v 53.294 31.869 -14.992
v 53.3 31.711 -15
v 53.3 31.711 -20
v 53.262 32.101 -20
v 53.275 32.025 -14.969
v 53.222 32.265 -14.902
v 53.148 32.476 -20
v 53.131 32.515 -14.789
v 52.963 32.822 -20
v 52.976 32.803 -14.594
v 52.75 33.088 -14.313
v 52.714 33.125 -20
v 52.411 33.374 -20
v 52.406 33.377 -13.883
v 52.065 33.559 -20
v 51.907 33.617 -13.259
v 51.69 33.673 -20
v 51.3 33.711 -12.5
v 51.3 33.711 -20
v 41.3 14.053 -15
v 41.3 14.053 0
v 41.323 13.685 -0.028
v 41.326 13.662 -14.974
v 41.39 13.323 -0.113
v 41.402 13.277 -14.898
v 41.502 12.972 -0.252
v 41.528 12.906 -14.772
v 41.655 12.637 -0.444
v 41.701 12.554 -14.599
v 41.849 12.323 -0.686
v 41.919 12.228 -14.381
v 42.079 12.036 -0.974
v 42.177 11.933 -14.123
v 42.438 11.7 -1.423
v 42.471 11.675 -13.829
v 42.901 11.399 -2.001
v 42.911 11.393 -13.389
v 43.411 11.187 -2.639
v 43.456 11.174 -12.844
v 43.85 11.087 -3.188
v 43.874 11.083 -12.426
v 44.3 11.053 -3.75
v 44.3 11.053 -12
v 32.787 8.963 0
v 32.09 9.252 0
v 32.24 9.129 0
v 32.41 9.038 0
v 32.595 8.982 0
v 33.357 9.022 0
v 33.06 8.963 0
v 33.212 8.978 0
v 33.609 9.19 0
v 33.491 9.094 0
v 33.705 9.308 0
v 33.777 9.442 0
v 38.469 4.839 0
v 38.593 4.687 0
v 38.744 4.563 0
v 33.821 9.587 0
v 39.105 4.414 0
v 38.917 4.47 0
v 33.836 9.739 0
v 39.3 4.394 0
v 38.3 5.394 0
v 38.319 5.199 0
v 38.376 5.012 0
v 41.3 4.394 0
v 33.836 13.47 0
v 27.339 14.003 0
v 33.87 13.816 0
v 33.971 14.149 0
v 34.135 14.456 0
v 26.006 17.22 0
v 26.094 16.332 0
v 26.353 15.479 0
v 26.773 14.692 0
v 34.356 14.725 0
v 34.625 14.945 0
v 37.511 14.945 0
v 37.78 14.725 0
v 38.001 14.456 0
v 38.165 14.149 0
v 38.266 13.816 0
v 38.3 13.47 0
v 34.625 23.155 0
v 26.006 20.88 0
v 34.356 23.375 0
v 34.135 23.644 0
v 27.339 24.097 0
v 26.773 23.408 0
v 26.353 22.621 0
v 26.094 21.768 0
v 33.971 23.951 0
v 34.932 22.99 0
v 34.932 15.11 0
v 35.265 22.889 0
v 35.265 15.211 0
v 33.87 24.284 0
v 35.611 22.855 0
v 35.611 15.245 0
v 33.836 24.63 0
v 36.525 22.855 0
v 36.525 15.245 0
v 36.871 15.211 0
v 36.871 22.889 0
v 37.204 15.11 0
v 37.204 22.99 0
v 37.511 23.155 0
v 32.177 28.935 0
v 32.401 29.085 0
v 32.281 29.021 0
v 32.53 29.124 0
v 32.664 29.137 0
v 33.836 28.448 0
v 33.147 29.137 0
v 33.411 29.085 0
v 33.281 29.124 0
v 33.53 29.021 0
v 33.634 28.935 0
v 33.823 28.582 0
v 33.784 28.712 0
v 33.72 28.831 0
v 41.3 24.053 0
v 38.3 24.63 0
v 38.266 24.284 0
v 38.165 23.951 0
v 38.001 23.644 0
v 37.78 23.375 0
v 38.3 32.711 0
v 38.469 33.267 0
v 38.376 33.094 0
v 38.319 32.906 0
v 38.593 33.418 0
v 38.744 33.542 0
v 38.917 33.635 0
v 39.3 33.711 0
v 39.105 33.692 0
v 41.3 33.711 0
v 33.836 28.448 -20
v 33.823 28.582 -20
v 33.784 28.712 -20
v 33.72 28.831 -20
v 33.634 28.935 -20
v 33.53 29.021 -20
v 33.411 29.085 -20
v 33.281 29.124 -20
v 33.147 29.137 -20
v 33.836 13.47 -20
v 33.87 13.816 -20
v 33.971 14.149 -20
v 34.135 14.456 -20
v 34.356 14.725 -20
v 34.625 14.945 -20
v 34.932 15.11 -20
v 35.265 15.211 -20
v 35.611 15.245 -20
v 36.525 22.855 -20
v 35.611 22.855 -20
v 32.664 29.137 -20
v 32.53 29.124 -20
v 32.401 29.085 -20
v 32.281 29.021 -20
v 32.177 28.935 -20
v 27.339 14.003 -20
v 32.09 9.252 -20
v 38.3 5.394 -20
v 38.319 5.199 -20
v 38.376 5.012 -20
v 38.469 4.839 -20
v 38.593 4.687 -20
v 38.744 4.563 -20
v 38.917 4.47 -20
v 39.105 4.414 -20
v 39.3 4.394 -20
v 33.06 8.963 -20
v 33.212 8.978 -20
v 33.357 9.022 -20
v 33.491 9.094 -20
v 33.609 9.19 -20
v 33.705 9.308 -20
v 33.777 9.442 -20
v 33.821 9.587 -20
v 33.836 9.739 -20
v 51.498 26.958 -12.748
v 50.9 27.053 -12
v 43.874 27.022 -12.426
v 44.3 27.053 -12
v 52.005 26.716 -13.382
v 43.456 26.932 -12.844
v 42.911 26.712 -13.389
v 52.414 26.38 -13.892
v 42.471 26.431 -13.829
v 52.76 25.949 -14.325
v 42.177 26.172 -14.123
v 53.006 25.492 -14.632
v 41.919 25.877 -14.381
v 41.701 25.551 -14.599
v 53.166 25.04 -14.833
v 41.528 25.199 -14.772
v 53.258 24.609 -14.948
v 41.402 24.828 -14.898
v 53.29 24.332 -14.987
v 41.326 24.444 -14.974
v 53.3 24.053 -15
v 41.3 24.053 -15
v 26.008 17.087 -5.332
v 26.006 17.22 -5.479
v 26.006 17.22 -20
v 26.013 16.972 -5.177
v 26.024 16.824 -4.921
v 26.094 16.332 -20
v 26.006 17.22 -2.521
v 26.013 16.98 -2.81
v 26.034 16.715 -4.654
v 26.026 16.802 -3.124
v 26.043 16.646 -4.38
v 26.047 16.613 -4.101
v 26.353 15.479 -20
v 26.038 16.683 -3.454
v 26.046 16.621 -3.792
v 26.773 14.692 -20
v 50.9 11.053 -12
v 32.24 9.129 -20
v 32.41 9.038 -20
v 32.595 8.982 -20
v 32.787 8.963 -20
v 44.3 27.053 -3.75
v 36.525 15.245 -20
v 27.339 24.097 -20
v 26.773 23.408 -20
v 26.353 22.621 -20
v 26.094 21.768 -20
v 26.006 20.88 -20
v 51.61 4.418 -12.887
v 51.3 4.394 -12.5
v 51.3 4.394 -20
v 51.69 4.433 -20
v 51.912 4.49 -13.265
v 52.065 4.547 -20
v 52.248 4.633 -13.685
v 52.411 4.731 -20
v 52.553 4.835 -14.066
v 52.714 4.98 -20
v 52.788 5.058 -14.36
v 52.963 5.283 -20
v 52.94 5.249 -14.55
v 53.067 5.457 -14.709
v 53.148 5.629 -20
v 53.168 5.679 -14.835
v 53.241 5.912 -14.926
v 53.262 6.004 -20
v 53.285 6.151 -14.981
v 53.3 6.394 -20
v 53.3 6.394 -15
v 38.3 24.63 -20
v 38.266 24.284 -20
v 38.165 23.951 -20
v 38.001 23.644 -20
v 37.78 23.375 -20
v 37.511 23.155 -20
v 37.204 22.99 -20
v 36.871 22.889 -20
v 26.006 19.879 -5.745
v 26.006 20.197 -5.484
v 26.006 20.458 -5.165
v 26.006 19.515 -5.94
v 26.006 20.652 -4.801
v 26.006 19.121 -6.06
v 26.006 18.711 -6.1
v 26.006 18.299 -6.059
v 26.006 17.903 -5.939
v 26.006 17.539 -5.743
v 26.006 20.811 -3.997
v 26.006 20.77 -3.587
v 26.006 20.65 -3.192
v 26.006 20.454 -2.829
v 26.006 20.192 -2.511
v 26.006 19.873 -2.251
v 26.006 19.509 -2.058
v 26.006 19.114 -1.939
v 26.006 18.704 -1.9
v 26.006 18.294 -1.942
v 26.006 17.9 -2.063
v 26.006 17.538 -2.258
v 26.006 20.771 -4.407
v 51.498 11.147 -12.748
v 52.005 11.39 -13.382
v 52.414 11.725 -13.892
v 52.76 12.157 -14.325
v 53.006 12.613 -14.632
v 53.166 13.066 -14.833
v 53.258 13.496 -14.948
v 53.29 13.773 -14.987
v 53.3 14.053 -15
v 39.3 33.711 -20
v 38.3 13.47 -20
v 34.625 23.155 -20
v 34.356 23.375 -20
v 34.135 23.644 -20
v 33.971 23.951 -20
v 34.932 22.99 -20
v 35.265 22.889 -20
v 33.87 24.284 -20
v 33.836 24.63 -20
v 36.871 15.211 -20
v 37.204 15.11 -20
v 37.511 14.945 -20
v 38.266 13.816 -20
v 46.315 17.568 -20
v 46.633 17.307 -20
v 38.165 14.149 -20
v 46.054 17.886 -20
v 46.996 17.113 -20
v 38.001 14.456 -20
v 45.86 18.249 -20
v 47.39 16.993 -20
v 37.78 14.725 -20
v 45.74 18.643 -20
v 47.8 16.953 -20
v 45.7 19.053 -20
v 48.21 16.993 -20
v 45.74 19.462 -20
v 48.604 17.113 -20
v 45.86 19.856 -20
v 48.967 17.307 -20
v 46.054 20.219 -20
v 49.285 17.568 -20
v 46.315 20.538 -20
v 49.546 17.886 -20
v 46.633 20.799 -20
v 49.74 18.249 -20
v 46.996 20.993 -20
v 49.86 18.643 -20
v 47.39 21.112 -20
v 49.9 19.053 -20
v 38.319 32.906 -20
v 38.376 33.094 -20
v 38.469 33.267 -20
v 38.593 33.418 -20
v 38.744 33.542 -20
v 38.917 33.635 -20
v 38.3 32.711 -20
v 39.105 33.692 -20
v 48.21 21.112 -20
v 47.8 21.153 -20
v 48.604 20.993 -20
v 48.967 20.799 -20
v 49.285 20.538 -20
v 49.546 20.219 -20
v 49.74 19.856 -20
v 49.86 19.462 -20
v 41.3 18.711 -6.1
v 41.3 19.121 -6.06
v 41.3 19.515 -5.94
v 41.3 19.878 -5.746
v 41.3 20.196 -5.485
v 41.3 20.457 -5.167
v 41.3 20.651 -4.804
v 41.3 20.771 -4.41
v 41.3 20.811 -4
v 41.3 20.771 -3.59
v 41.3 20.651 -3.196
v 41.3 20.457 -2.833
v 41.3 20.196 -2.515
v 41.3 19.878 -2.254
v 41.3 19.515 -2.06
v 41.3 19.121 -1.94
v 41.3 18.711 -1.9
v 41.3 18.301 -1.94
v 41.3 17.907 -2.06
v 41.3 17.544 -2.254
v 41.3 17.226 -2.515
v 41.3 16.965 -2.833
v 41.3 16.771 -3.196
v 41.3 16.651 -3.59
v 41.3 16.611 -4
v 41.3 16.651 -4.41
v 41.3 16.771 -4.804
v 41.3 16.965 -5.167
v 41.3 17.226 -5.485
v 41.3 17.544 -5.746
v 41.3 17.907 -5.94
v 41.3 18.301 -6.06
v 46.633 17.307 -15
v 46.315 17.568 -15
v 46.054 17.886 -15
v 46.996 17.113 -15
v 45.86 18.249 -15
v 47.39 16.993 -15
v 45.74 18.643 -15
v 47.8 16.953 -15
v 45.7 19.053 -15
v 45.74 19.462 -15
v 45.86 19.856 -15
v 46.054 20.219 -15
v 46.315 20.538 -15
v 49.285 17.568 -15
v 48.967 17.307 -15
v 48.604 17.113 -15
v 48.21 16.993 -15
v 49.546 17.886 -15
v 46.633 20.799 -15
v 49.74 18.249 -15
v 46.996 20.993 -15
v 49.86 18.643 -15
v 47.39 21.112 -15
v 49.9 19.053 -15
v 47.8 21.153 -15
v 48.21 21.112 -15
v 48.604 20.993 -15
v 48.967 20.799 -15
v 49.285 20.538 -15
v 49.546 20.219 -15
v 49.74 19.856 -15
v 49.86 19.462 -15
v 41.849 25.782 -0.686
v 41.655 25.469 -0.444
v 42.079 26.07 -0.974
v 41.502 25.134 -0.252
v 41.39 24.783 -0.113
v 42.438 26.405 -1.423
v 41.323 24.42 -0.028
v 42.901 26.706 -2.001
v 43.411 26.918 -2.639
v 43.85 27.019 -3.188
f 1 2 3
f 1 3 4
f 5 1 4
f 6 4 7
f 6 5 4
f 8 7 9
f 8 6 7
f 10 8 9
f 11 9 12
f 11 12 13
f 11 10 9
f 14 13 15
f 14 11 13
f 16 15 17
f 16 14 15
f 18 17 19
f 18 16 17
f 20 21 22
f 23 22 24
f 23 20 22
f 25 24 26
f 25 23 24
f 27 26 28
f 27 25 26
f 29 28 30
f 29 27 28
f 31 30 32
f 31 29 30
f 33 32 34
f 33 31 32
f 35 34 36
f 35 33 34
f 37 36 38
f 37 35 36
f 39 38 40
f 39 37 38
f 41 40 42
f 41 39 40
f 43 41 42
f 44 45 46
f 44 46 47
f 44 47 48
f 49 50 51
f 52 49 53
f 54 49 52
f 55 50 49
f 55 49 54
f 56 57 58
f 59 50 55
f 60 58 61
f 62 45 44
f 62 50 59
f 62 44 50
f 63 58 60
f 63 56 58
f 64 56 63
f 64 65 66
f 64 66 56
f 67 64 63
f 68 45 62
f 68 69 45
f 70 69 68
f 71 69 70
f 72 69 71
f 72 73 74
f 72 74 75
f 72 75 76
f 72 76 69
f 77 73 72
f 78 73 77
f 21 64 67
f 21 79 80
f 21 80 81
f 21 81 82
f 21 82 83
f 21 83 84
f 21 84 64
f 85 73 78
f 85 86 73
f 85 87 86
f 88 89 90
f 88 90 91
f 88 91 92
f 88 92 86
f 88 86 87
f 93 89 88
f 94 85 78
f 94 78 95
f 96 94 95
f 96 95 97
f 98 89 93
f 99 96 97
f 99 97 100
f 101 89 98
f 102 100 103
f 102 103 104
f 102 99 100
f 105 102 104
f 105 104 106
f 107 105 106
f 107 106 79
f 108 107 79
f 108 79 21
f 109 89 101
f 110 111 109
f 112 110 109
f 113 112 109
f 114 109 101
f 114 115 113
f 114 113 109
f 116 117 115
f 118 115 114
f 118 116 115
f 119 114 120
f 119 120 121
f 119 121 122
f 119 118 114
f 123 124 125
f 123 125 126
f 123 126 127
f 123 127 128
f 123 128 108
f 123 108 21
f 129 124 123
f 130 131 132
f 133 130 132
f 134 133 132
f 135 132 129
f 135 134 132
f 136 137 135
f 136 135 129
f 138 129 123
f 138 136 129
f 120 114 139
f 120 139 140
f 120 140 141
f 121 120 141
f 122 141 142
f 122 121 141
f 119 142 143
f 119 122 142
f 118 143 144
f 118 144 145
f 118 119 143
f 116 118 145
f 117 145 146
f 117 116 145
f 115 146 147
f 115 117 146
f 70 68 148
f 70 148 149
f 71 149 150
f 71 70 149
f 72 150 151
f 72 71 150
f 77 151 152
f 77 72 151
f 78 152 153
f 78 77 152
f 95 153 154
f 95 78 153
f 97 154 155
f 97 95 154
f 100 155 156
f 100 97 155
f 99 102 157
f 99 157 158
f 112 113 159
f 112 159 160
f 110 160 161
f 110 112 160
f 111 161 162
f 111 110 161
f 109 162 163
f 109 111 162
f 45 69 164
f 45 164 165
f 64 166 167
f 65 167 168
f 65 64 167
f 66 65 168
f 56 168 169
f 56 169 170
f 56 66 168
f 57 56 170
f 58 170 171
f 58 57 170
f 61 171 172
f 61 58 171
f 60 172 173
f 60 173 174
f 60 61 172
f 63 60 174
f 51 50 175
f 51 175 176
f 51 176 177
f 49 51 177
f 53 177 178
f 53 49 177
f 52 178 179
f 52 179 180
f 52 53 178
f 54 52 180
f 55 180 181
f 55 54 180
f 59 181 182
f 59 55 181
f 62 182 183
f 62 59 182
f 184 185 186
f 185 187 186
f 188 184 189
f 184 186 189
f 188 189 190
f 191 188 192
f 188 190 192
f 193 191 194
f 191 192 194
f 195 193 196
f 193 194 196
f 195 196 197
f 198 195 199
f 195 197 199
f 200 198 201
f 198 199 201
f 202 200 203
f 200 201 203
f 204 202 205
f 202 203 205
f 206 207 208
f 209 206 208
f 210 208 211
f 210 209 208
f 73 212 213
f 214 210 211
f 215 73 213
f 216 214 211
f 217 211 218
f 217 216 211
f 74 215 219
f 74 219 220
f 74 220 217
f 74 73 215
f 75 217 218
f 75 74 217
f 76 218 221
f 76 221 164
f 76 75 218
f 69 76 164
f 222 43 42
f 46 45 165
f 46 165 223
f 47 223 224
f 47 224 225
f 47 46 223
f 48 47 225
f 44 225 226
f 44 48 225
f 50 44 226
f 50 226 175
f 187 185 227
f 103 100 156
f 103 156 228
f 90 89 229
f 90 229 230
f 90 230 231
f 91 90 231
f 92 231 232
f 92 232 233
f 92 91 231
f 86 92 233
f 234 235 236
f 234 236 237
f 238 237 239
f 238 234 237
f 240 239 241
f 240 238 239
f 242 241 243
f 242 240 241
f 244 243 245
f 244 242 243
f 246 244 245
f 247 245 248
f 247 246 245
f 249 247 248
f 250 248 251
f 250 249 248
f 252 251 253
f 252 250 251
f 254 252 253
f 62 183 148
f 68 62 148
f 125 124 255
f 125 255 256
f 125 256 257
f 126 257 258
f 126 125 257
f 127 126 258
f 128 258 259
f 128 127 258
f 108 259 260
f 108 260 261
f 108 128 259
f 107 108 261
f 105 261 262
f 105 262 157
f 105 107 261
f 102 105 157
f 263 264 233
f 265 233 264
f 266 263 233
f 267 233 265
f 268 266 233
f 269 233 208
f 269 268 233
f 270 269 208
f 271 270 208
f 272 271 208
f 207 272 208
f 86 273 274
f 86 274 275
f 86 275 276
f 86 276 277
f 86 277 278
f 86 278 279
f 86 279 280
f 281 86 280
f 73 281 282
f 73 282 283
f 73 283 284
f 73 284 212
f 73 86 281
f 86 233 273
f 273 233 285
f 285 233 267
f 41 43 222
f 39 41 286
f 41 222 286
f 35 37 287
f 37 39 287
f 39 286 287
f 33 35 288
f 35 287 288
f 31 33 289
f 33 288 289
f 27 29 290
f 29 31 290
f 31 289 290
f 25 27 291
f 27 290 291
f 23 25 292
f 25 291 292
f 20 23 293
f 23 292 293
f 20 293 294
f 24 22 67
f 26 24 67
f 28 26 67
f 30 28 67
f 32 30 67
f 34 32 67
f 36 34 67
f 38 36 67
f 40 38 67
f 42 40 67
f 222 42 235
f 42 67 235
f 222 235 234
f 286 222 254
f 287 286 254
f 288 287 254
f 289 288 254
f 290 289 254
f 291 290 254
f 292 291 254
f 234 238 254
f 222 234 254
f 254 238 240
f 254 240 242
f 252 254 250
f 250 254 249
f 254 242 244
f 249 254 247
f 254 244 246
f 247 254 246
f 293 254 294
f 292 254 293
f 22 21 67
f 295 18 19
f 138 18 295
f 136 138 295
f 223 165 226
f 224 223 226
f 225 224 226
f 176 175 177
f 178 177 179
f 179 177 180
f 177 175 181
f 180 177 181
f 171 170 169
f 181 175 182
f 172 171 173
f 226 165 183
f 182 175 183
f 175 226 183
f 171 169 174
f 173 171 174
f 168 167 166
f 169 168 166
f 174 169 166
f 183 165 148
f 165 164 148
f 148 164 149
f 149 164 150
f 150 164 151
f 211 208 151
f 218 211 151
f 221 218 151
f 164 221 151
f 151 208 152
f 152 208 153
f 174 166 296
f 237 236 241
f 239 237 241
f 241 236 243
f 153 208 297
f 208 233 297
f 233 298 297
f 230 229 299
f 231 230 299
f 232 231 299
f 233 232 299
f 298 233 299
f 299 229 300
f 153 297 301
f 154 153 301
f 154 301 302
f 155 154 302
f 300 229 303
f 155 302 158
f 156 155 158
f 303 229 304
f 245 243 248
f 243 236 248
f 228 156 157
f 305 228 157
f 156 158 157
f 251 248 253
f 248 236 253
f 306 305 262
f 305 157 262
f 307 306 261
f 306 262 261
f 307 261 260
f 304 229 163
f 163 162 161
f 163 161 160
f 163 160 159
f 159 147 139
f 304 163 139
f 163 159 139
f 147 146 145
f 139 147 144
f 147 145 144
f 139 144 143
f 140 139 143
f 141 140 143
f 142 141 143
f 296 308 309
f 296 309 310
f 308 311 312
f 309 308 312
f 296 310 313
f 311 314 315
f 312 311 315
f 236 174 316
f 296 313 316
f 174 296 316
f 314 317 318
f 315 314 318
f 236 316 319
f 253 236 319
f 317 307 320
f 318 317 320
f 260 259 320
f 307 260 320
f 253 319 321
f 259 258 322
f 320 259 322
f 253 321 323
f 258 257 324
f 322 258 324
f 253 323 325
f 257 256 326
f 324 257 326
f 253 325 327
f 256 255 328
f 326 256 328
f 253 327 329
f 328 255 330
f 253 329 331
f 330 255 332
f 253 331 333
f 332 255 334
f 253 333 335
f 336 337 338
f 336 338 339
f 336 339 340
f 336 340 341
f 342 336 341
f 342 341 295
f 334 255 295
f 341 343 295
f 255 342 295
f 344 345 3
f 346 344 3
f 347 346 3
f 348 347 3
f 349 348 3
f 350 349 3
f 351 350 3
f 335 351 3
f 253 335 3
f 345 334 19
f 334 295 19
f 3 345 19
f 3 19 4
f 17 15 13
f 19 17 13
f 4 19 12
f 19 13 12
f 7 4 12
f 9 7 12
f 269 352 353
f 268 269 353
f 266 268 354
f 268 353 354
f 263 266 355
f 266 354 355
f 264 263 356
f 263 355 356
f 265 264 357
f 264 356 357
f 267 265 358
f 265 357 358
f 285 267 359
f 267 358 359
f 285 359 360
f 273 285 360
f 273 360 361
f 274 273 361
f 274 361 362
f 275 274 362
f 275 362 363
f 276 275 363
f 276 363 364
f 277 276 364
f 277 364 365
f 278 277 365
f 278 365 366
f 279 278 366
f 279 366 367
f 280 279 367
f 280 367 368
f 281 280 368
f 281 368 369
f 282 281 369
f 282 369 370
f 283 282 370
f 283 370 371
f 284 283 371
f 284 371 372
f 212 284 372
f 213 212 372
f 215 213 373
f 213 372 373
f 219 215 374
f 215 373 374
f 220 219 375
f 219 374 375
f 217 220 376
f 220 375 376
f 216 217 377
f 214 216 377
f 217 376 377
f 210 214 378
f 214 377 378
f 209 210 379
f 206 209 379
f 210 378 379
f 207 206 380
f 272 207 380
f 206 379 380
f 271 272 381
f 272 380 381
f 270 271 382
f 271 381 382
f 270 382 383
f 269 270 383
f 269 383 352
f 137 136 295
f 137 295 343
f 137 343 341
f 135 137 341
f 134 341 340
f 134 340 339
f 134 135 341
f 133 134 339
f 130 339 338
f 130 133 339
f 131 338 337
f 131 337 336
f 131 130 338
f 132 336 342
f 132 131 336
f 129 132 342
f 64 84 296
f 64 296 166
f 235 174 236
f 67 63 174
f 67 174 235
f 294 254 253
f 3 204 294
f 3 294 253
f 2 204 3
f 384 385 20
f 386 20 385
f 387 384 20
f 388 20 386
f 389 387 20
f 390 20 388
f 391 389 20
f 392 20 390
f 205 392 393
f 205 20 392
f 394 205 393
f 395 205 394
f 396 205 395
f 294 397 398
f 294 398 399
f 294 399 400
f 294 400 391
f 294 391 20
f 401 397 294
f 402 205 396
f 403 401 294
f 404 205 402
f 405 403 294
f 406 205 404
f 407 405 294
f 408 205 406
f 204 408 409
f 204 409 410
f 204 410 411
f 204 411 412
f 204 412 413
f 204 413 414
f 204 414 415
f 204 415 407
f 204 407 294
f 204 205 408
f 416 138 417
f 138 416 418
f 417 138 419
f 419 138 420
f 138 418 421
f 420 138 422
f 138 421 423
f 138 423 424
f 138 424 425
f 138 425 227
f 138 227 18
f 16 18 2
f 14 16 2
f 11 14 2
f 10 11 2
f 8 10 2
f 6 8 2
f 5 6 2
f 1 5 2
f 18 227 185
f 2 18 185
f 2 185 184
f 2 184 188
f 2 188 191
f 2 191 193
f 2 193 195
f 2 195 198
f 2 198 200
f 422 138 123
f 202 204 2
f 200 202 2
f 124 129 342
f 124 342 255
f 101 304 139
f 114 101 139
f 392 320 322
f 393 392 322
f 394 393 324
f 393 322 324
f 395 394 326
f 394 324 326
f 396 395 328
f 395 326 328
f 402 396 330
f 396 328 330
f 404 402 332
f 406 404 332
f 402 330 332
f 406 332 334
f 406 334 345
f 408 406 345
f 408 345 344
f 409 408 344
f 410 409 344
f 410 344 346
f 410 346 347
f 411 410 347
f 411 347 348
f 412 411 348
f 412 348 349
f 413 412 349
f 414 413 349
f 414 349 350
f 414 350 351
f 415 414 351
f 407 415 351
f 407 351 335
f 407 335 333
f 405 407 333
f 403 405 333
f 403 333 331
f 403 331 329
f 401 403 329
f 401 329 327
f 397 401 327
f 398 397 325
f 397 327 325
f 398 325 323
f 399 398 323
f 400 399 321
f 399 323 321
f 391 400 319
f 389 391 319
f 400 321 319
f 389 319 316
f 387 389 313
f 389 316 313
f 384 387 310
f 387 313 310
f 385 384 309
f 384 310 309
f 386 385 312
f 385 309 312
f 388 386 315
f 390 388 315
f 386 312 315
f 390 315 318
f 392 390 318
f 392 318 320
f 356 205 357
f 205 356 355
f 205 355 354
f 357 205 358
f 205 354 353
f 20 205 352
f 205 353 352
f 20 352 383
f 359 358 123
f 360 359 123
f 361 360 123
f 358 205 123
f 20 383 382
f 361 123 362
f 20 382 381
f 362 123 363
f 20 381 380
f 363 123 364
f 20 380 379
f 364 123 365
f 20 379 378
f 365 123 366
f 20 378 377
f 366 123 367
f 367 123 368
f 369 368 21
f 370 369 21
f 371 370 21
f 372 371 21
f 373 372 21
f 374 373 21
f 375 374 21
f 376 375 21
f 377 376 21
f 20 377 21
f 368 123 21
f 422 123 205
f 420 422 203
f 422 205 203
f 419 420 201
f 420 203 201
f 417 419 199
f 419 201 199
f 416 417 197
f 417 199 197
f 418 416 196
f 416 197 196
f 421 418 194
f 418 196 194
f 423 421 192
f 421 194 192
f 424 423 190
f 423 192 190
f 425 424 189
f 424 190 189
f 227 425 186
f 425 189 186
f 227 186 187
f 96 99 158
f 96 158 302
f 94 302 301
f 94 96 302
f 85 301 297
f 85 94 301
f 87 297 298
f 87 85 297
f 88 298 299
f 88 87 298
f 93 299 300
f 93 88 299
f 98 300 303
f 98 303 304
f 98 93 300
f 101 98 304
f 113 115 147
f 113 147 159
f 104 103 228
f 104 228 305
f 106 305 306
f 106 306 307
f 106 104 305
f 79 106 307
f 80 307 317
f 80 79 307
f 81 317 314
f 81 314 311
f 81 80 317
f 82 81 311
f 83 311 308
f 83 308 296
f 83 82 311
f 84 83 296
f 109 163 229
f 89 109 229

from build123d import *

# Parameters (mm, degrees)
BOSS_EXTRUDE1_DEPTH = 20
CUT_EXTRUDE5_DEPTH  = 15
SKETCH3_R           = 2.1
CUT_EXTRUDE2_DEPTH  = 43.075221209
SKETCH5_R           = 2.1
CUT_EXTRUDE4_DEPTH  = 67.161318327
CUT_EXTRUDE6_DEPTH  = 65.034014837
FILLET1_R           = 3


with BuildPart() as part:
    # Sketch1 → Boss-Extrude1 (new body)
    with BuildSketch(Plane.XY):
        with BuildLine():
            Line((38.3, 10.745623604), (38.3, 9.881410941))
            Line((38.3, 9.881410941), (38.3, 5.394343623))
            ThreePointArc((38.3, 5.394343623), (38.592893219, 4.687236842), (39.3, 4.394343623))
            Line((39.3, 4.394343623), (40.3, 4.394343623))
            Line((40.3, 4.394343623), (51.3, 4.394343623))
            ThreePointArc((51.3, 4.394343623), (52.714213562, 4.98013006), (53.3, 6.394343623))
            Line((53.3, 6.394343623), (53.3, 29.710978016))
            Line((53.3, 29.710978016), (53.3, 31.710978016))
            ThreePointArc((53.3, 31.710978016), (52.714213562, 33.125191579), (51.3, 33.710978016))
            Line((51.3, 33.710978016), (41.3, 33.710978016))
            Line((41.3, 33.710978016), (39.3, 33.710978016))
            ThreePointArc((39.3, 33.710978016), (38.592893219, 33.418084798), (38.3, 32.710978016))
            Line((38.3, 32.710978016), (38.3, 28.215588568))
            Line((38.3, 28.215588568), (38.3, 27.353495632))
            Line((38.3, 27.353495632), (38.3, 24.630195866))
            ThreePointArc((38.3, 24.630195866), (37.780173169, 23.37522288), (36.525200183, 22.855396049))
            Line((36.525200183, 22.855396049), (35.6108, 22.855396049))
            ThreePointArc((35.6108, 22.855396049), (34.355826885, 23.375222934), (33.836, 24.630196049))
            Line((33.836, 24.630196049), (33.836, 28.448))
            ThreePointArc((33.836, 28.448), (33.634196572, 28.935196572), (33.147, 29.137))
            Line((33.147, 29.137), (32.664287242, 29.137))
            ThreePointArc((32.664287242, 29.137), (32.400617966, 29.084552836), (32.177090071, 28.935195973))
            Line((32.177090071, 28.935195973), (27.33900161, 24.097095612))
            ThreePointArc((27.33900161, 24.097095612), (26.352731832, 22.621035632), (26.0064, 20.879905136))
            Line((26.0064, 20.879905136), (26.0064, 17.220094864))
            ThreePointArc((26.0064, 17.220094864), (26.352731832, 15.478964368), (27.33900161, 14.002904388))
            Line((27.33900161, 14.002904388), (32.090366071, 9.25152824))
            ThreePointArc((32.090366071, 9.25152824), (32.409953896, 9.037986056), (32.786933649, 8.963))
            Line((32.786933649, 8.963), (33.060275787, 8.963))
            ThreePointArc((33.060275787, 8.963), (33.608795638, 9.190204362), (33.836, 9.738724213))
            Line((33.836, 9.738724213), (33.836, 13.469803585))
            ThreePointArc((33.836, 13.469803585), (34.355826992, 14.724776959), (35.610800366, 15.244603951))
            Line((35.610800366, 15.244603951), (36.5252, 15.244603951))
            ThreePointArc((36.5252, 15.244603951), (37.780173115, 14.724777066), (38.3, 13.469803951))
            Line((38.3, 13.469803951), (38.3, 10.745623604))
        make_face()
    extrude(amount=-BOSS_EXTRUDE1_DEPTH)

    # Sketch6 → Cut-Extrude5 (cut)
    with BuildSketch(Plane.XY):
        Polygon((53.3, 19.05266082), (53.3, 27.05266082), (41.3, 27.05266082), (41.3, 13.469803951), (41.3, 11.05266082), (53.3, 11.05266082), align=None)
    extrude(amount=-CUT_EXTRUDE5_DEPTH, mode=Mode.SUBTRACT)

    # Sketch3 → Cut-Extrude2 (cut, through all)
    with BuildSketch(Plane(origin=(41.3, 0, 0), x_dir=(0, 0, -1), z_dir=(1, 0, 0))):
        with Locations((4, 18.710978016)):
            Circle(SKETCH3_R)
    extrude(amount=-CUT_EXTRUDE2_DEPTH, mode=Mode.SUBTRACT)

    # Sketch5 → Cut-Extrude4 (cut, through all)
    with BuildSketch(Plane(origin=(0, 0, -20), x_dir=(-1, 0, 0), z_dir=(0, 0, -1))):
        with Locations((-47.8, 19.05266082)):
            Circle(SKETCH5_R)
    extrude(amount=-CUT_EXTRUDE4_DEPTH, mode=Mode.SUBTRACT)

    # Sketch7 → Cut-Extrude6 (cut, through all)
    with BuildSketch(Plane.XZ.offset(-4.394343623)):
        Polygon((41.3, 0), (53.3, -15), (53.3, 0), align=None)
    extrude(amount=-CUT_EXTRUDE6_DEPTH, mode=Mode.SUBTRACT)

    # Fillet1
    fillet1_edges = [part.edges().sort_by_distance(p)[0] for p in [
        (41.3, 11.05266082, -7.5),
        (41.3, 27.05266082, -7.5),
        (47.3, 11.05266082, -15),
        (47.3, 27.05266082, -15),
    ]]
    fillet(fillet1_edges, radius=FILLET1_R)


solid = part.part
